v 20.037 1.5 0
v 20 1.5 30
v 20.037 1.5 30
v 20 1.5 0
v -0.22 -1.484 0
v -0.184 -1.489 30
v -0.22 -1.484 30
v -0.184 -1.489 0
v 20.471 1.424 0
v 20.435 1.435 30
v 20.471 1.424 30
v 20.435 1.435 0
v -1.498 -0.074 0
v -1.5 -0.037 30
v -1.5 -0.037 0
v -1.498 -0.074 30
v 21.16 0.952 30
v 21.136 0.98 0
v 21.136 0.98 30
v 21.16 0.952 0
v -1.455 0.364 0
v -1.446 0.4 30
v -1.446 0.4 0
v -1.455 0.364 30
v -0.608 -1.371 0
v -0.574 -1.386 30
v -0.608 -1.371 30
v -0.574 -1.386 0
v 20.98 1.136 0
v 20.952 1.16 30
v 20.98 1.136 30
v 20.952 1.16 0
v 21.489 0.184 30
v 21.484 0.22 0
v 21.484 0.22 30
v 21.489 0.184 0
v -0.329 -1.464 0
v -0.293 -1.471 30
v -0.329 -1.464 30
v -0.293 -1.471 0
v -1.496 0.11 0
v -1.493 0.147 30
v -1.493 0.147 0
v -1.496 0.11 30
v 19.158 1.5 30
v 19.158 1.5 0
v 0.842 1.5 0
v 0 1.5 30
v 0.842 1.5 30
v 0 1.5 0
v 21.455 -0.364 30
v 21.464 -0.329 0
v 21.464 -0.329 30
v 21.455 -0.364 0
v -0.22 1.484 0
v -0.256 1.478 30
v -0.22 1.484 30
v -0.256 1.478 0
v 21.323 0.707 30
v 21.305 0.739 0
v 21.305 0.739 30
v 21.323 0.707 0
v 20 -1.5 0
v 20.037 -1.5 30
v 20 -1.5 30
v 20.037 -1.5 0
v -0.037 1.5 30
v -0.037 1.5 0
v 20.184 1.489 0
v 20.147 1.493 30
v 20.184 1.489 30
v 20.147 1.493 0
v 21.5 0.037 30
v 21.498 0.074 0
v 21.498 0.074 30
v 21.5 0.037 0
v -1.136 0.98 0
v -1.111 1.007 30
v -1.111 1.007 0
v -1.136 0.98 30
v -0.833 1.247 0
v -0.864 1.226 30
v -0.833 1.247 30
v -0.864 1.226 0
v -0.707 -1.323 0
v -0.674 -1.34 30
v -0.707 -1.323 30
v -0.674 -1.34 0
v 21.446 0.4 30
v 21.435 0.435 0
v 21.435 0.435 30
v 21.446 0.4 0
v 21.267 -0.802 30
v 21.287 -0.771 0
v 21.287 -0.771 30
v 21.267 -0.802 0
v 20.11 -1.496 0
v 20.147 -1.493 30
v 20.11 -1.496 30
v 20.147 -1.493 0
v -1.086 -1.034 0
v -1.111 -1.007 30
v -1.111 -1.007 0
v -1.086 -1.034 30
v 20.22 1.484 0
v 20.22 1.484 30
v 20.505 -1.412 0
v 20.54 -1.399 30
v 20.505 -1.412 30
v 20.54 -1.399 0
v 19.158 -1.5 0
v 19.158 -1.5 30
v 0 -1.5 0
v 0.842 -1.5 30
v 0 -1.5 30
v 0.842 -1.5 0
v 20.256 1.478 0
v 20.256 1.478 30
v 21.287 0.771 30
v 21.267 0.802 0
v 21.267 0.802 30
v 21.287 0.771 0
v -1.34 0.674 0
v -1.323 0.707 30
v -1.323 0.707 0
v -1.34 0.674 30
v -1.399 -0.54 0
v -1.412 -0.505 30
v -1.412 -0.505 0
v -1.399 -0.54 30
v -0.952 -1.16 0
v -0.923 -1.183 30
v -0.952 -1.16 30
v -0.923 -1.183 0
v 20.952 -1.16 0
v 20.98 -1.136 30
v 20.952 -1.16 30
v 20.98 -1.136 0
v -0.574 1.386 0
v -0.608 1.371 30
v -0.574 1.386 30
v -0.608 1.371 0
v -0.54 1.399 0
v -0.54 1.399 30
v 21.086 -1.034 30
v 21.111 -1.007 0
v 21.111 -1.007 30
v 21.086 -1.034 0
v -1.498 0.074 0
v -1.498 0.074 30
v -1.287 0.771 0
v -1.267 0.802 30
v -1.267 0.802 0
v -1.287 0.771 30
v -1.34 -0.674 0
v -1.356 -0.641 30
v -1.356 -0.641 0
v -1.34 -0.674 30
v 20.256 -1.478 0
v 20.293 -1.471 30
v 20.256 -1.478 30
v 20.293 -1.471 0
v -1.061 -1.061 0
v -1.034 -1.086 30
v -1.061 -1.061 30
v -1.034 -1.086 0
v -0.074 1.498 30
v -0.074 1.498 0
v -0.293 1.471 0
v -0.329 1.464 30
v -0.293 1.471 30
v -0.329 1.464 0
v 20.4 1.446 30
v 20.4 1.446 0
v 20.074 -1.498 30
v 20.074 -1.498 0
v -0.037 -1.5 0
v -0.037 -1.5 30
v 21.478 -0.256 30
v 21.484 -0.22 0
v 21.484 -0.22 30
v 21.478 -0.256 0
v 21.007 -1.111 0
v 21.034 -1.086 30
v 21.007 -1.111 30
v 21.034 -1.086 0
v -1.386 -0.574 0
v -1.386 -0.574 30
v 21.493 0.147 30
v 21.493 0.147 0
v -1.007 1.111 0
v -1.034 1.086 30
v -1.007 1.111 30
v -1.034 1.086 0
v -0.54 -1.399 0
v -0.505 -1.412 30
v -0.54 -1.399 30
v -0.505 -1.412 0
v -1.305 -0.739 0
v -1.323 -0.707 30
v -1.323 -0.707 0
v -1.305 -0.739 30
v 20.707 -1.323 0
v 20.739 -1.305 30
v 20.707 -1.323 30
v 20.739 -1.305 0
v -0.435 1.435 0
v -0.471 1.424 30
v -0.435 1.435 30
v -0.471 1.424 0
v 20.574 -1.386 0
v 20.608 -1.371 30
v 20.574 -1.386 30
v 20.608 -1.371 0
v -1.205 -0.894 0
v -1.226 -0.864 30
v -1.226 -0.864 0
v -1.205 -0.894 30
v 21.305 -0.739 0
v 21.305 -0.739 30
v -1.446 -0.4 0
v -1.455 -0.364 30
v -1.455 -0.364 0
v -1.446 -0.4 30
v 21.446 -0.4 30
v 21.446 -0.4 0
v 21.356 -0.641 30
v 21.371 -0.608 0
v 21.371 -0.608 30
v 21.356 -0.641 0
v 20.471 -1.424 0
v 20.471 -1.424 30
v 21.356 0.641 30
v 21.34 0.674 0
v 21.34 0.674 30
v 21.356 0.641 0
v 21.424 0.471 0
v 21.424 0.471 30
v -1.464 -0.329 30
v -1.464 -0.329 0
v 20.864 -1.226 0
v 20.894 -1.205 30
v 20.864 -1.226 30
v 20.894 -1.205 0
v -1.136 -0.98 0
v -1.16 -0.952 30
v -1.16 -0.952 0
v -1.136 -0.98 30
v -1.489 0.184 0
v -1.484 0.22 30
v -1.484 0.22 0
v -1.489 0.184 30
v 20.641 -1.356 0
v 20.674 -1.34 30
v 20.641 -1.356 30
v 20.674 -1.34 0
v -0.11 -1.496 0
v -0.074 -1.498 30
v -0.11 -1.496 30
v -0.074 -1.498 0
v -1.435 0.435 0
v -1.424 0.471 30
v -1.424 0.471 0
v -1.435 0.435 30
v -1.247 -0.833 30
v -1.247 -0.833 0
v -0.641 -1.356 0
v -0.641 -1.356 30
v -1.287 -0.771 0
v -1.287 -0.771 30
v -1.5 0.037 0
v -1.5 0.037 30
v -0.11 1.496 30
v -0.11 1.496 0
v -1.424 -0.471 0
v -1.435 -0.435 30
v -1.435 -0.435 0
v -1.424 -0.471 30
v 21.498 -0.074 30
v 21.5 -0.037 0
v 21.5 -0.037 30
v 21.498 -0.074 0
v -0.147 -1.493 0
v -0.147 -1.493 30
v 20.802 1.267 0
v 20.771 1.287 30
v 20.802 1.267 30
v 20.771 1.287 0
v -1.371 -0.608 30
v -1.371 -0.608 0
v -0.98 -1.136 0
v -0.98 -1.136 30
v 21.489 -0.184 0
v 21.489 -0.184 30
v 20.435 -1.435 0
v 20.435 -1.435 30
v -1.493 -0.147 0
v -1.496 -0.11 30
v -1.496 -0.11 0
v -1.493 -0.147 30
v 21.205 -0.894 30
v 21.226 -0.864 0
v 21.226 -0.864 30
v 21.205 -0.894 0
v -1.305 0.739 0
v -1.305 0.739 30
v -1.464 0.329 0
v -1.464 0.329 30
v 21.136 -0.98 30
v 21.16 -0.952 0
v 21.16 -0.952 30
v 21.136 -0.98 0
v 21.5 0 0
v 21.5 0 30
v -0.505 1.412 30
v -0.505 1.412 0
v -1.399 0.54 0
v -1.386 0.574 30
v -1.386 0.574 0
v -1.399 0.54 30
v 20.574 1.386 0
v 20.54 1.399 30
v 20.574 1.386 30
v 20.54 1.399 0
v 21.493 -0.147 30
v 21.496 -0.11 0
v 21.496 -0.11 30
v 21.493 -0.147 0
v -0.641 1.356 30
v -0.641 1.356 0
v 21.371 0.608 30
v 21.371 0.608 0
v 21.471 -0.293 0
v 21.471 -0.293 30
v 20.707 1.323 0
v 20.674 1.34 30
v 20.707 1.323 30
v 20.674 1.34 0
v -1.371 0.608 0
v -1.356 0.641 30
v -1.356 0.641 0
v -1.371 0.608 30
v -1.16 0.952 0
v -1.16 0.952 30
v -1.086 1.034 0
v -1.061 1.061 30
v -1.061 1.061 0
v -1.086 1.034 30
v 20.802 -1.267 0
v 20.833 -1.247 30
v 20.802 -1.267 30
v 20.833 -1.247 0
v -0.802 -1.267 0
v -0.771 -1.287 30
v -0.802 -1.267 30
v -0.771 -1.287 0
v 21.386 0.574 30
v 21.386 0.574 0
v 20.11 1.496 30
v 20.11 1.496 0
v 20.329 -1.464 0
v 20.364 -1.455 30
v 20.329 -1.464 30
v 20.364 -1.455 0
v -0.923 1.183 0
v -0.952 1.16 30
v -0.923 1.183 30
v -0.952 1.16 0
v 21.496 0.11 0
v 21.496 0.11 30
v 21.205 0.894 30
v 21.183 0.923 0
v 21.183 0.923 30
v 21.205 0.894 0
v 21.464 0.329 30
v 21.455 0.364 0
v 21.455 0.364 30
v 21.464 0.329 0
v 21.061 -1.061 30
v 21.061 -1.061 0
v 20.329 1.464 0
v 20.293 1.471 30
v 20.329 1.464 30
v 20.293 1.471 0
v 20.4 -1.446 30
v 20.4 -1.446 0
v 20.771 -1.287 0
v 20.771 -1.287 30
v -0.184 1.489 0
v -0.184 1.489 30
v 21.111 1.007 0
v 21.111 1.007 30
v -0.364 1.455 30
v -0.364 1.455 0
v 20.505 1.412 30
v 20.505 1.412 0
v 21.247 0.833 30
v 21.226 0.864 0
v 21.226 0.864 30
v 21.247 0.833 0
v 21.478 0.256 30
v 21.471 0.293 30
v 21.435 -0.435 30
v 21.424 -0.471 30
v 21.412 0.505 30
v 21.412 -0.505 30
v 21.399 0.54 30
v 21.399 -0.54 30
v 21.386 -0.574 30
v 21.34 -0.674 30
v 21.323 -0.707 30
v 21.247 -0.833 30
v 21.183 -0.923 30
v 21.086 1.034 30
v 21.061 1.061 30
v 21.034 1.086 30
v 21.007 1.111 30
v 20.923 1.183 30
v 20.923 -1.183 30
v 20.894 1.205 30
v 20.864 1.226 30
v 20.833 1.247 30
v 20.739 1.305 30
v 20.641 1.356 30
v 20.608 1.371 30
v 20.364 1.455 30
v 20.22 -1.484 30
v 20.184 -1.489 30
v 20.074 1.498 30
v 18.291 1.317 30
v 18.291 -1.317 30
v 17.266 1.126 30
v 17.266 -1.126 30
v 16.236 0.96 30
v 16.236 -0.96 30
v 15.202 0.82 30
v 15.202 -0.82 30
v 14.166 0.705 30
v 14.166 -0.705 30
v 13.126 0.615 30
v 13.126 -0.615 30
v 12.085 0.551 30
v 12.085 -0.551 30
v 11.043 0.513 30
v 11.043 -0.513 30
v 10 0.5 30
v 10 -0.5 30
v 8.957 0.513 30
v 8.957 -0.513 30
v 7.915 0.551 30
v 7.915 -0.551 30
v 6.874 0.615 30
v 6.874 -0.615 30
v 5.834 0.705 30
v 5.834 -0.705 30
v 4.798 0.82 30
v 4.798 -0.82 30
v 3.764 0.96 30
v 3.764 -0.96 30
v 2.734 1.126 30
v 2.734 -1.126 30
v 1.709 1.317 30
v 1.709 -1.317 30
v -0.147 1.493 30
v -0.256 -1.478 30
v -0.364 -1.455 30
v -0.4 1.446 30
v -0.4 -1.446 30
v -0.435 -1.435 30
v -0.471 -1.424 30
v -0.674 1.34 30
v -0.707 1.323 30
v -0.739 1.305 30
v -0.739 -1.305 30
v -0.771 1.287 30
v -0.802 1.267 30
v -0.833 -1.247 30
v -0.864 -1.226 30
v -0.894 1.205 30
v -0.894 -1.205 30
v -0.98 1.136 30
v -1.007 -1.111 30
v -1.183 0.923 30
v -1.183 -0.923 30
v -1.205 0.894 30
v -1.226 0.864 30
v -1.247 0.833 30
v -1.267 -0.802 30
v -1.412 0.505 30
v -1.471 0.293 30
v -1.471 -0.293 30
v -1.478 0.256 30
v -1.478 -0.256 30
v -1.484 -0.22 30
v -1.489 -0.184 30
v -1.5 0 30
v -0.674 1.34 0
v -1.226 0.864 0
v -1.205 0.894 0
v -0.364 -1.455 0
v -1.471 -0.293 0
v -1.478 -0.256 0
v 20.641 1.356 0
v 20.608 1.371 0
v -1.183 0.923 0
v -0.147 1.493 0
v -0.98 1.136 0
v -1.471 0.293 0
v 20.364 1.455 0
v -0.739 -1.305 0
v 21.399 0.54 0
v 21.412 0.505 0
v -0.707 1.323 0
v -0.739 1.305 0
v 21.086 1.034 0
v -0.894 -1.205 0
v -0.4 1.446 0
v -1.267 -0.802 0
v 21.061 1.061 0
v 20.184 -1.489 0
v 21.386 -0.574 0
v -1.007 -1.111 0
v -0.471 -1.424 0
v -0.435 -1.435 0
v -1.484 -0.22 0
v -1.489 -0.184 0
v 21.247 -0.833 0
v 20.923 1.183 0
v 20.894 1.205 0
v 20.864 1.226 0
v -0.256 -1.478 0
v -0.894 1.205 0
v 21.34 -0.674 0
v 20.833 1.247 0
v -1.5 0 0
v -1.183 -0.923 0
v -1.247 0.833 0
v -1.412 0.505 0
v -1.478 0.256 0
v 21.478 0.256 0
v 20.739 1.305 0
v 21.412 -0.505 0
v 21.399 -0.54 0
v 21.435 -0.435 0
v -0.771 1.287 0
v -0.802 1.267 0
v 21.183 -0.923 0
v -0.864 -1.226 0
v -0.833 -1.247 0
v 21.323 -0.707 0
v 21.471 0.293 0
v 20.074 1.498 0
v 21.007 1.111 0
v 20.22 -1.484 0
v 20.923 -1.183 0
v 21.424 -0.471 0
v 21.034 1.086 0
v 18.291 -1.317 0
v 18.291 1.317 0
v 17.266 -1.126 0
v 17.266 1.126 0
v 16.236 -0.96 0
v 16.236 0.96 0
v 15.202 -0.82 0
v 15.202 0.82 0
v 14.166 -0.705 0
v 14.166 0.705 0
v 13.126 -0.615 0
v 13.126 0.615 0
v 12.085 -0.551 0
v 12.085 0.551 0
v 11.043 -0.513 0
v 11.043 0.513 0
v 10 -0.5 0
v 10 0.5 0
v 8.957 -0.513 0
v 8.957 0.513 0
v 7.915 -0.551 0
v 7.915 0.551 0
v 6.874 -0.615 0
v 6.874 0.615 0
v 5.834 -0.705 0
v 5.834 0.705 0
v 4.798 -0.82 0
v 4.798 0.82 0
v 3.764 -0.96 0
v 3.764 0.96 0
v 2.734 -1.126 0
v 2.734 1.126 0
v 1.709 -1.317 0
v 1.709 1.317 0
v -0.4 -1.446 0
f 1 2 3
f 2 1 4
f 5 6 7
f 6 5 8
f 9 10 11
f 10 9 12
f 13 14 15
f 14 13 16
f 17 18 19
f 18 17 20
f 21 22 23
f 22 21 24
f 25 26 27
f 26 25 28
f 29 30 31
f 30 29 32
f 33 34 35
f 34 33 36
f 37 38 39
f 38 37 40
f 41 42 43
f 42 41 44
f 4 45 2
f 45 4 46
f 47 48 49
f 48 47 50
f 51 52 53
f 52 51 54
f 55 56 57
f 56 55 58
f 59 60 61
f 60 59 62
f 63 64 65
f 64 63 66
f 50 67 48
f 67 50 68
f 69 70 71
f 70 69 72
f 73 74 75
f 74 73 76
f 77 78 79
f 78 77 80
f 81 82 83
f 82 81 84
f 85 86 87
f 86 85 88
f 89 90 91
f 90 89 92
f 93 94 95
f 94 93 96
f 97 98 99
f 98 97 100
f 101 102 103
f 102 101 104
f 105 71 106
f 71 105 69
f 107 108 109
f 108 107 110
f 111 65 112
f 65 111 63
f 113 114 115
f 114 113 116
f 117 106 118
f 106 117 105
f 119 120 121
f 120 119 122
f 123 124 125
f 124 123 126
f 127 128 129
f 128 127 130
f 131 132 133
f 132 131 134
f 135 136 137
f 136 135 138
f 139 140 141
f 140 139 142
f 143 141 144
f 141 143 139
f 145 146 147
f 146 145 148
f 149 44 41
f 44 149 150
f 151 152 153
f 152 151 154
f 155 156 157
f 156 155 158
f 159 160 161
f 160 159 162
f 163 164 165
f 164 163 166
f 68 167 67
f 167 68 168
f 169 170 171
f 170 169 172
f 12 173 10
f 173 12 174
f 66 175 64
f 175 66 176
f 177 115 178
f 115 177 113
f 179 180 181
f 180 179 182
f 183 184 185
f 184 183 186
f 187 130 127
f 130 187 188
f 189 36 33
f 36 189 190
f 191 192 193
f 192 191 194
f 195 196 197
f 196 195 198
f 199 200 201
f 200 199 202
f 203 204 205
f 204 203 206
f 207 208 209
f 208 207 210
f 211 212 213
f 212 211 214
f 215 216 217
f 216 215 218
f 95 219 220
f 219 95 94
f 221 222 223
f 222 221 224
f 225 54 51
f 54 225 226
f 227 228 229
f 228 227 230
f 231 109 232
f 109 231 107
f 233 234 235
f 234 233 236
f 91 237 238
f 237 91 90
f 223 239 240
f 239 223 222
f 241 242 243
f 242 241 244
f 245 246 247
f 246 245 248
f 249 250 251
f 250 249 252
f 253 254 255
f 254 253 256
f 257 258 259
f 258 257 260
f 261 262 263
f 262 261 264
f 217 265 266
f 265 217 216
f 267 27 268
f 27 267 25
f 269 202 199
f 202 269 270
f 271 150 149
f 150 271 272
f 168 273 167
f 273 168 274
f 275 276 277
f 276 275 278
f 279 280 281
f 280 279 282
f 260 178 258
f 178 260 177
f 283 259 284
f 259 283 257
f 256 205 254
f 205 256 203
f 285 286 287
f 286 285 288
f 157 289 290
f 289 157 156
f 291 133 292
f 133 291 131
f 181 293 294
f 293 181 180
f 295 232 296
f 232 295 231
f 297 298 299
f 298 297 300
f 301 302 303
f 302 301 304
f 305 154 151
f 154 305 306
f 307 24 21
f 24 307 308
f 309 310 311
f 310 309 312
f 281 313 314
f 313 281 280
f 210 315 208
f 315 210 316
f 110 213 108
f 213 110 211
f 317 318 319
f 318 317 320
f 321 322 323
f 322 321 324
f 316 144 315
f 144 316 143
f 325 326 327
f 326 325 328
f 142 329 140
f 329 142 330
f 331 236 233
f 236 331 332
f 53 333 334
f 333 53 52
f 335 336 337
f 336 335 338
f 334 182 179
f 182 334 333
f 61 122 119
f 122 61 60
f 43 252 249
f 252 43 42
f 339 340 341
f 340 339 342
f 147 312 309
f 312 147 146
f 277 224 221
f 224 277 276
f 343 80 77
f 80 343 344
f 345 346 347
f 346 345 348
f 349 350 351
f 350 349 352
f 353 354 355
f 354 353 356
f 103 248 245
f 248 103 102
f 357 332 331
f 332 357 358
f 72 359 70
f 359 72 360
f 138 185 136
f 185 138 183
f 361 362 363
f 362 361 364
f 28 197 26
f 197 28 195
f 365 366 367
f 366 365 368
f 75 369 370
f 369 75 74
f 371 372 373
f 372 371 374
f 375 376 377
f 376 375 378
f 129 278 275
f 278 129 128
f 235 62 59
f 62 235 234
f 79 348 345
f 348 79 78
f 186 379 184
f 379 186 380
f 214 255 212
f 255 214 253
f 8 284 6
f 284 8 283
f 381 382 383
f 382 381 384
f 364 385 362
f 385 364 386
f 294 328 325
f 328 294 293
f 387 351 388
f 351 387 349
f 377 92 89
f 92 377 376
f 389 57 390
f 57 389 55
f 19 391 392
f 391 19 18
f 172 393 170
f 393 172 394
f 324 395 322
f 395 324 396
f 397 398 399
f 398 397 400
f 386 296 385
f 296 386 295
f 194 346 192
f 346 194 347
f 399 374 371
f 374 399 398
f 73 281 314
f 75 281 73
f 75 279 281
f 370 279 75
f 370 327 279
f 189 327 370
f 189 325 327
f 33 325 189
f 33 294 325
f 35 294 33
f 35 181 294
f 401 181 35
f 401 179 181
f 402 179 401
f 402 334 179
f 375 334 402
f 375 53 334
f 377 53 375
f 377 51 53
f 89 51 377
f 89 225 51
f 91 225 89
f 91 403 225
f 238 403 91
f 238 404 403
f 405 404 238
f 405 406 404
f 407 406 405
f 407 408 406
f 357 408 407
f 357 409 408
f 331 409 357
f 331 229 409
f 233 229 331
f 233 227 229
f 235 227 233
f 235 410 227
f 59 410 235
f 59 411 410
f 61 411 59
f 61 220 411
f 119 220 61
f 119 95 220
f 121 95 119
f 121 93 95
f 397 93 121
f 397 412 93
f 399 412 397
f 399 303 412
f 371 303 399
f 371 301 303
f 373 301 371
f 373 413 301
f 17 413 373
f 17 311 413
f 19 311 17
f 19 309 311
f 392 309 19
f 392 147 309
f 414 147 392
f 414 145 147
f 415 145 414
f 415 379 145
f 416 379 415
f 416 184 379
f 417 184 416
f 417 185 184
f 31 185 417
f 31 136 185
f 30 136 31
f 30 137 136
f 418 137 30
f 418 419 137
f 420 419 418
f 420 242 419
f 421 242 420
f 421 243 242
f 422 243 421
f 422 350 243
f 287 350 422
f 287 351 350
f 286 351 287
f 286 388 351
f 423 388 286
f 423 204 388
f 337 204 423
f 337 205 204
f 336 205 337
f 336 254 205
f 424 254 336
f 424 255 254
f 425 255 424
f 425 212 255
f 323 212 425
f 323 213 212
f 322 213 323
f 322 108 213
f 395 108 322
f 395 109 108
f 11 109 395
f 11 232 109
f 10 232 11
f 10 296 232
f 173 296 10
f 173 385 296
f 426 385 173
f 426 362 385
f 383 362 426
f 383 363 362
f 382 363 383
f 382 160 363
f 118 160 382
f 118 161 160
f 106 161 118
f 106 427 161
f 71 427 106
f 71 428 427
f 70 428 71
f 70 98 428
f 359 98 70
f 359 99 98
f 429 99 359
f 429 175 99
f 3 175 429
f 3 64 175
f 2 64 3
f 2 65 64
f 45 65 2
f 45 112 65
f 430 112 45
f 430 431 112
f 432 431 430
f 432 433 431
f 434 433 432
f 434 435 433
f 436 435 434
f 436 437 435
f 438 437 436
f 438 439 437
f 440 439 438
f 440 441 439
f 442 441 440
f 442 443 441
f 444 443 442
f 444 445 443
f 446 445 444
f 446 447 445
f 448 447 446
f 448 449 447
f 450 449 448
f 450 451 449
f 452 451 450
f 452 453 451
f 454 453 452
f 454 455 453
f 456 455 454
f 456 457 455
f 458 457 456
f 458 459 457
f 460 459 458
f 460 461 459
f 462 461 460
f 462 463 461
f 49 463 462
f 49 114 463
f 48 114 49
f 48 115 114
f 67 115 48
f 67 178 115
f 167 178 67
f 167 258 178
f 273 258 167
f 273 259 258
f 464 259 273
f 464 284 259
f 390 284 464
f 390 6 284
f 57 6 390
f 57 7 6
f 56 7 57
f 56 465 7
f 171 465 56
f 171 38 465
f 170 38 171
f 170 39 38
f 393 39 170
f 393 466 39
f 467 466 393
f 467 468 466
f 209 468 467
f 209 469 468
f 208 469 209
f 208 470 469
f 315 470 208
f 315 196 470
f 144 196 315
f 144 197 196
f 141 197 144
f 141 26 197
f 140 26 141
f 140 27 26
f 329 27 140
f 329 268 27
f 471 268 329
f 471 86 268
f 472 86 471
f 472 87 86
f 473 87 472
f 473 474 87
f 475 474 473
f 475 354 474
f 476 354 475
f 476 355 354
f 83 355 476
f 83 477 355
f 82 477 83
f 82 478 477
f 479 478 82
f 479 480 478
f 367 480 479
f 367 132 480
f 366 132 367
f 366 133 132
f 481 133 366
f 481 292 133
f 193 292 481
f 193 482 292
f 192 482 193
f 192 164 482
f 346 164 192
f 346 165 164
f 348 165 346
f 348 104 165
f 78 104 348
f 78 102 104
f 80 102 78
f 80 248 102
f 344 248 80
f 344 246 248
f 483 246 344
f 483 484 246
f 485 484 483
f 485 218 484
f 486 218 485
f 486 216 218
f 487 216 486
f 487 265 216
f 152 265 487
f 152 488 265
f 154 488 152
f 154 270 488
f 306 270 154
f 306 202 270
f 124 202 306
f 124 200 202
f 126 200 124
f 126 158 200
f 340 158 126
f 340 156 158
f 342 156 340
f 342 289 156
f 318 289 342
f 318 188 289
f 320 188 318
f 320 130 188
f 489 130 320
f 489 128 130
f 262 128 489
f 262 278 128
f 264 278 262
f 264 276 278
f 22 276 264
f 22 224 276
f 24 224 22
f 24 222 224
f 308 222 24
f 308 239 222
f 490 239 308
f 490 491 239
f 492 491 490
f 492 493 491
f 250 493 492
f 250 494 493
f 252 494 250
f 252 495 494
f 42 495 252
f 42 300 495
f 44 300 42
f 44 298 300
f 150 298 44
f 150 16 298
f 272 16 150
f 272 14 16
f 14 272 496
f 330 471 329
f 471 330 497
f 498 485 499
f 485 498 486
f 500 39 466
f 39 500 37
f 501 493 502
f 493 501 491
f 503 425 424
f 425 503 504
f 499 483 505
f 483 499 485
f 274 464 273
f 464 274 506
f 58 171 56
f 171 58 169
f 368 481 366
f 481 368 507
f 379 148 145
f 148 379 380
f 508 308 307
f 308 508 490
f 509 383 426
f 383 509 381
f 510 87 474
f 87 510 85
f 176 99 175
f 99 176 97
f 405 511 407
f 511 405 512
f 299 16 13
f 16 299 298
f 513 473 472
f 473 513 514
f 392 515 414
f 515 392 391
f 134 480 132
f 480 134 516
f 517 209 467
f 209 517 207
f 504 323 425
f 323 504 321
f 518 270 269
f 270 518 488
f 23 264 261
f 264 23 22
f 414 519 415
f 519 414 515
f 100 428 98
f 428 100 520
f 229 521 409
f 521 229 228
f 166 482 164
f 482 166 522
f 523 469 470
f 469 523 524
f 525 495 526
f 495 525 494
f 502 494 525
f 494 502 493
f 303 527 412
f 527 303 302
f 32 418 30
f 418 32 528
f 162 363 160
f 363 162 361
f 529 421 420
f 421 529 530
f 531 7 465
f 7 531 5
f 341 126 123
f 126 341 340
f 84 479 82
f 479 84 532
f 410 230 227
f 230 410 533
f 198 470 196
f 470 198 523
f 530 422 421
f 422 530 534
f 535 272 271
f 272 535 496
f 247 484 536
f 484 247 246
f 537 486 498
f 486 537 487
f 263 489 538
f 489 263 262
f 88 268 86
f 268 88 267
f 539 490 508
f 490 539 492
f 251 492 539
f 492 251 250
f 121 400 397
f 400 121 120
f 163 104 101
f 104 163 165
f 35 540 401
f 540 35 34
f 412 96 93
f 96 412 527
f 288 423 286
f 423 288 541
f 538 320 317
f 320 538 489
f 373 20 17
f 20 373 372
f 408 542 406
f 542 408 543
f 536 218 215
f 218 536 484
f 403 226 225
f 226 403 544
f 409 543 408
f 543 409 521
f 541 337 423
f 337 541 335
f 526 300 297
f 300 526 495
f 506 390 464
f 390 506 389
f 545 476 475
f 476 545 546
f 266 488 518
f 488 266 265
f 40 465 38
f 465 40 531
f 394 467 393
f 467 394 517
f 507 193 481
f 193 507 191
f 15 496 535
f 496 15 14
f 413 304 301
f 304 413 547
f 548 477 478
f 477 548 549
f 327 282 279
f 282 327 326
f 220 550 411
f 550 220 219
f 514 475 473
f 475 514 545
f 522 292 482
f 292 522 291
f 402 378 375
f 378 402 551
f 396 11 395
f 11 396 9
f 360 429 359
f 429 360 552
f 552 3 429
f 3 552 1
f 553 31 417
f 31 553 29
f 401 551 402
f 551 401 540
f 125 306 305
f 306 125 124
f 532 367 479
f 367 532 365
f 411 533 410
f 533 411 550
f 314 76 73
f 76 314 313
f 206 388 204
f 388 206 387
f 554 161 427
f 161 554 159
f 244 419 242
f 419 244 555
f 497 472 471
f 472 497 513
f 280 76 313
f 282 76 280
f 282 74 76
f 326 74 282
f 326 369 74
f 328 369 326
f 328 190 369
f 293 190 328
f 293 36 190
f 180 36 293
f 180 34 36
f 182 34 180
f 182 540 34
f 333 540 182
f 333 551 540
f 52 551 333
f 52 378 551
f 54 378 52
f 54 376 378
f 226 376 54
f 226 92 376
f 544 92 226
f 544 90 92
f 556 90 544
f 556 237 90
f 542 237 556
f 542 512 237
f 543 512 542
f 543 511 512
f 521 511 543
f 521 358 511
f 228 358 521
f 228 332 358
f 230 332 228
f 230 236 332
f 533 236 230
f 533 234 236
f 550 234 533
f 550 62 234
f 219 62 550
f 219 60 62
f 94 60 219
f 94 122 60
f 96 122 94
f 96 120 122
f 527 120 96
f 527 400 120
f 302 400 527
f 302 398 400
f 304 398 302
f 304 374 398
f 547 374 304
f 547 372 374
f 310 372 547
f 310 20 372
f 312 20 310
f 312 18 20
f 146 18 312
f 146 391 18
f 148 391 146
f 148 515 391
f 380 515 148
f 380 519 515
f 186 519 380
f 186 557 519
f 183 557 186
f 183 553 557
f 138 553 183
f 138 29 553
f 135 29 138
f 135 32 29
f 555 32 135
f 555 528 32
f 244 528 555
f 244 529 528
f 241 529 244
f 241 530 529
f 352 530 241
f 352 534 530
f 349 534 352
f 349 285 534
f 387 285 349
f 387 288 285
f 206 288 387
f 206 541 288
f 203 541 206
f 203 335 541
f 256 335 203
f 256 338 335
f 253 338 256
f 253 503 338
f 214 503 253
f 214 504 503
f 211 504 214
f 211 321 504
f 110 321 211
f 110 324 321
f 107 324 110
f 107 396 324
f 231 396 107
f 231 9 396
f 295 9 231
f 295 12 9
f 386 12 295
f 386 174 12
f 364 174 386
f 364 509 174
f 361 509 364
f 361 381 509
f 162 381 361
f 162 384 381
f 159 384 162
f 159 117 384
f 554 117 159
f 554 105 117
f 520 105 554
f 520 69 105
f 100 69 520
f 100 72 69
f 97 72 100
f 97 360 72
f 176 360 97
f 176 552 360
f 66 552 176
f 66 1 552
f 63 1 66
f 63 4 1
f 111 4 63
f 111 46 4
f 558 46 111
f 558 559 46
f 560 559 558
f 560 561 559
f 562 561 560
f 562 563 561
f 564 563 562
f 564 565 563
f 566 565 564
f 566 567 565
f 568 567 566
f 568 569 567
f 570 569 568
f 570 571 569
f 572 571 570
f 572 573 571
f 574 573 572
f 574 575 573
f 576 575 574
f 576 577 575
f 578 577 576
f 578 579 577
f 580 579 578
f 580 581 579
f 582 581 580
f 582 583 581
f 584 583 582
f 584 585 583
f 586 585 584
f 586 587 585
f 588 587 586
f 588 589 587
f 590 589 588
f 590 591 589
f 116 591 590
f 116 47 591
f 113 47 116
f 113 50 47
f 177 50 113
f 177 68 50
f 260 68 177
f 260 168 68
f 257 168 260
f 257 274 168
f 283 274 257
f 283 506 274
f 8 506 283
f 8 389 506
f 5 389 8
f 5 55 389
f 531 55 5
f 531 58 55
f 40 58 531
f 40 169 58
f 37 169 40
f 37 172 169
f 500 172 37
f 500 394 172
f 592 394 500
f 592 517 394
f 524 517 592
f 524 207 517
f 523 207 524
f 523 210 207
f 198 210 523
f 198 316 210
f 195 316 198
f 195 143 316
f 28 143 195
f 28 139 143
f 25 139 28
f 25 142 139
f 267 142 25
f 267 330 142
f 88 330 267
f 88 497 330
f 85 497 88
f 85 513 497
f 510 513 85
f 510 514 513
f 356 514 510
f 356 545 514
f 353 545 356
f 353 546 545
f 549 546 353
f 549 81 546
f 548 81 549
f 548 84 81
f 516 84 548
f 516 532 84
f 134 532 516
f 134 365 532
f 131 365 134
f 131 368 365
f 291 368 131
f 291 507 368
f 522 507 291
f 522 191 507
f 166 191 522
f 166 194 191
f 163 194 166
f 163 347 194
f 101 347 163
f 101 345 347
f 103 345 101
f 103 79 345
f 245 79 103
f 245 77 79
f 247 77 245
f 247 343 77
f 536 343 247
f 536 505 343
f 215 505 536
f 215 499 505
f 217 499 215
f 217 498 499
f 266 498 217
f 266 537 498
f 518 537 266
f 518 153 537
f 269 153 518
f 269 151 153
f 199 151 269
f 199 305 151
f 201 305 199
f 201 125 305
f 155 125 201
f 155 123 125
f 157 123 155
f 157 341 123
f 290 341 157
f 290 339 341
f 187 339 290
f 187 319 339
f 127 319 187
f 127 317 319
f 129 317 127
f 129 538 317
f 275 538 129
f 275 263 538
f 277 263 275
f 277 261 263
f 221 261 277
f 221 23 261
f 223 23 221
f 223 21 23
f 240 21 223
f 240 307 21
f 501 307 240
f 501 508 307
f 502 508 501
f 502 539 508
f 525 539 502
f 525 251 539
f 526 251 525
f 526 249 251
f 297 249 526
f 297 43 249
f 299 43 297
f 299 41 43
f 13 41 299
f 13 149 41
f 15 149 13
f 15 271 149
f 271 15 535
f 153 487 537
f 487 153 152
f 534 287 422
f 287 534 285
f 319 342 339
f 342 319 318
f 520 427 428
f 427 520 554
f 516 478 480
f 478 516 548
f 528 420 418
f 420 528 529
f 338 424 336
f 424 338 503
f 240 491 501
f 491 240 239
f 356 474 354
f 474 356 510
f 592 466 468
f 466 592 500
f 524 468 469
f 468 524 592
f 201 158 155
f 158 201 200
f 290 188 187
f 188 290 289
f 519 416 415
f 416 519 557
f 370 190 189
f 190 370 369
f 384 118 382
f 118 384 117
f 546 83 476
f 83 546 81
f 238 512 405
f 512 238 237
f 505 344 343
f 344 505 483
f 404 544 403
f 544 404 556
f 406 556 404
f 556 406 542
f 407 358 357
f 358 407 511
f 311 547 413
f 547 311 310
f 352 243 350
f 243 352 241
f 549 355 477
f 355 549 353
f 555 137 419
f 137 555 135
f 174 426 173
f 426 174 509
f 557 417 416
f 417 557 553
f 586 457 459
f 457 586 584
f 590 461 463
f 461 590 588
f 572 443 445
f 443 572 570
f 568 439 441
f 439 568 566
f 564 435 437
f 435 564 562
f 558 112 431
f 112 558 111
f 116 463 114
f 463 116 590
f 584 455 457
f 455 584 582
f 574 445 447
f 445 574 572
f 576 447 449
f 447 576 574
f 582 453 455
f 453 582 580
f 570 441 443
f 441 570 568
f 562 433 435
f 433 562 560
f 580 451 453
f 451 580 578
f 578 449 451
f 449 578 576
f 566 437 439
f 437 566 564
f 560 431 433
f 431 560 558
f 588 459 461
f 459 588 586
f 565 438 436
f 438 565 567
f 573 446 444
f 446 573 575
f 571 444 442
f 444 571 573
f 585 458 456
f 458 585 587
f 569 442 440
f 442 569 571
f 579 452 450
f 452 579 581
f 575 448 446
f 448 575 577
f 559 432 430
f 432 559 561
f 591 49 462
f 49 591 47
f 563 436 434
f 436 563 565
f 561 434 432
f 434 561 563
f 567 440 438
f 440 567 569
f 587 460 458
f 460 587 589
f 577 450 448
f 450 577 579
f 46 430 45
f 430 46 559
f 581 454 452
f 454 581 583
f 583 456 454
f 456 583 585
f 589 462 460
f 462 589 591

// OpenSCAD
$fn=256;

difference() {
    hull() {
        cylinder(h=30,d=3);
        translate([20,0,0])
            cylinder(h=30,d=3);
    }
    translate([10,-43,0]) cylinder(h=30,d=85);
    translate([10,43,0]) cylinder(h=30,d=85);
}
